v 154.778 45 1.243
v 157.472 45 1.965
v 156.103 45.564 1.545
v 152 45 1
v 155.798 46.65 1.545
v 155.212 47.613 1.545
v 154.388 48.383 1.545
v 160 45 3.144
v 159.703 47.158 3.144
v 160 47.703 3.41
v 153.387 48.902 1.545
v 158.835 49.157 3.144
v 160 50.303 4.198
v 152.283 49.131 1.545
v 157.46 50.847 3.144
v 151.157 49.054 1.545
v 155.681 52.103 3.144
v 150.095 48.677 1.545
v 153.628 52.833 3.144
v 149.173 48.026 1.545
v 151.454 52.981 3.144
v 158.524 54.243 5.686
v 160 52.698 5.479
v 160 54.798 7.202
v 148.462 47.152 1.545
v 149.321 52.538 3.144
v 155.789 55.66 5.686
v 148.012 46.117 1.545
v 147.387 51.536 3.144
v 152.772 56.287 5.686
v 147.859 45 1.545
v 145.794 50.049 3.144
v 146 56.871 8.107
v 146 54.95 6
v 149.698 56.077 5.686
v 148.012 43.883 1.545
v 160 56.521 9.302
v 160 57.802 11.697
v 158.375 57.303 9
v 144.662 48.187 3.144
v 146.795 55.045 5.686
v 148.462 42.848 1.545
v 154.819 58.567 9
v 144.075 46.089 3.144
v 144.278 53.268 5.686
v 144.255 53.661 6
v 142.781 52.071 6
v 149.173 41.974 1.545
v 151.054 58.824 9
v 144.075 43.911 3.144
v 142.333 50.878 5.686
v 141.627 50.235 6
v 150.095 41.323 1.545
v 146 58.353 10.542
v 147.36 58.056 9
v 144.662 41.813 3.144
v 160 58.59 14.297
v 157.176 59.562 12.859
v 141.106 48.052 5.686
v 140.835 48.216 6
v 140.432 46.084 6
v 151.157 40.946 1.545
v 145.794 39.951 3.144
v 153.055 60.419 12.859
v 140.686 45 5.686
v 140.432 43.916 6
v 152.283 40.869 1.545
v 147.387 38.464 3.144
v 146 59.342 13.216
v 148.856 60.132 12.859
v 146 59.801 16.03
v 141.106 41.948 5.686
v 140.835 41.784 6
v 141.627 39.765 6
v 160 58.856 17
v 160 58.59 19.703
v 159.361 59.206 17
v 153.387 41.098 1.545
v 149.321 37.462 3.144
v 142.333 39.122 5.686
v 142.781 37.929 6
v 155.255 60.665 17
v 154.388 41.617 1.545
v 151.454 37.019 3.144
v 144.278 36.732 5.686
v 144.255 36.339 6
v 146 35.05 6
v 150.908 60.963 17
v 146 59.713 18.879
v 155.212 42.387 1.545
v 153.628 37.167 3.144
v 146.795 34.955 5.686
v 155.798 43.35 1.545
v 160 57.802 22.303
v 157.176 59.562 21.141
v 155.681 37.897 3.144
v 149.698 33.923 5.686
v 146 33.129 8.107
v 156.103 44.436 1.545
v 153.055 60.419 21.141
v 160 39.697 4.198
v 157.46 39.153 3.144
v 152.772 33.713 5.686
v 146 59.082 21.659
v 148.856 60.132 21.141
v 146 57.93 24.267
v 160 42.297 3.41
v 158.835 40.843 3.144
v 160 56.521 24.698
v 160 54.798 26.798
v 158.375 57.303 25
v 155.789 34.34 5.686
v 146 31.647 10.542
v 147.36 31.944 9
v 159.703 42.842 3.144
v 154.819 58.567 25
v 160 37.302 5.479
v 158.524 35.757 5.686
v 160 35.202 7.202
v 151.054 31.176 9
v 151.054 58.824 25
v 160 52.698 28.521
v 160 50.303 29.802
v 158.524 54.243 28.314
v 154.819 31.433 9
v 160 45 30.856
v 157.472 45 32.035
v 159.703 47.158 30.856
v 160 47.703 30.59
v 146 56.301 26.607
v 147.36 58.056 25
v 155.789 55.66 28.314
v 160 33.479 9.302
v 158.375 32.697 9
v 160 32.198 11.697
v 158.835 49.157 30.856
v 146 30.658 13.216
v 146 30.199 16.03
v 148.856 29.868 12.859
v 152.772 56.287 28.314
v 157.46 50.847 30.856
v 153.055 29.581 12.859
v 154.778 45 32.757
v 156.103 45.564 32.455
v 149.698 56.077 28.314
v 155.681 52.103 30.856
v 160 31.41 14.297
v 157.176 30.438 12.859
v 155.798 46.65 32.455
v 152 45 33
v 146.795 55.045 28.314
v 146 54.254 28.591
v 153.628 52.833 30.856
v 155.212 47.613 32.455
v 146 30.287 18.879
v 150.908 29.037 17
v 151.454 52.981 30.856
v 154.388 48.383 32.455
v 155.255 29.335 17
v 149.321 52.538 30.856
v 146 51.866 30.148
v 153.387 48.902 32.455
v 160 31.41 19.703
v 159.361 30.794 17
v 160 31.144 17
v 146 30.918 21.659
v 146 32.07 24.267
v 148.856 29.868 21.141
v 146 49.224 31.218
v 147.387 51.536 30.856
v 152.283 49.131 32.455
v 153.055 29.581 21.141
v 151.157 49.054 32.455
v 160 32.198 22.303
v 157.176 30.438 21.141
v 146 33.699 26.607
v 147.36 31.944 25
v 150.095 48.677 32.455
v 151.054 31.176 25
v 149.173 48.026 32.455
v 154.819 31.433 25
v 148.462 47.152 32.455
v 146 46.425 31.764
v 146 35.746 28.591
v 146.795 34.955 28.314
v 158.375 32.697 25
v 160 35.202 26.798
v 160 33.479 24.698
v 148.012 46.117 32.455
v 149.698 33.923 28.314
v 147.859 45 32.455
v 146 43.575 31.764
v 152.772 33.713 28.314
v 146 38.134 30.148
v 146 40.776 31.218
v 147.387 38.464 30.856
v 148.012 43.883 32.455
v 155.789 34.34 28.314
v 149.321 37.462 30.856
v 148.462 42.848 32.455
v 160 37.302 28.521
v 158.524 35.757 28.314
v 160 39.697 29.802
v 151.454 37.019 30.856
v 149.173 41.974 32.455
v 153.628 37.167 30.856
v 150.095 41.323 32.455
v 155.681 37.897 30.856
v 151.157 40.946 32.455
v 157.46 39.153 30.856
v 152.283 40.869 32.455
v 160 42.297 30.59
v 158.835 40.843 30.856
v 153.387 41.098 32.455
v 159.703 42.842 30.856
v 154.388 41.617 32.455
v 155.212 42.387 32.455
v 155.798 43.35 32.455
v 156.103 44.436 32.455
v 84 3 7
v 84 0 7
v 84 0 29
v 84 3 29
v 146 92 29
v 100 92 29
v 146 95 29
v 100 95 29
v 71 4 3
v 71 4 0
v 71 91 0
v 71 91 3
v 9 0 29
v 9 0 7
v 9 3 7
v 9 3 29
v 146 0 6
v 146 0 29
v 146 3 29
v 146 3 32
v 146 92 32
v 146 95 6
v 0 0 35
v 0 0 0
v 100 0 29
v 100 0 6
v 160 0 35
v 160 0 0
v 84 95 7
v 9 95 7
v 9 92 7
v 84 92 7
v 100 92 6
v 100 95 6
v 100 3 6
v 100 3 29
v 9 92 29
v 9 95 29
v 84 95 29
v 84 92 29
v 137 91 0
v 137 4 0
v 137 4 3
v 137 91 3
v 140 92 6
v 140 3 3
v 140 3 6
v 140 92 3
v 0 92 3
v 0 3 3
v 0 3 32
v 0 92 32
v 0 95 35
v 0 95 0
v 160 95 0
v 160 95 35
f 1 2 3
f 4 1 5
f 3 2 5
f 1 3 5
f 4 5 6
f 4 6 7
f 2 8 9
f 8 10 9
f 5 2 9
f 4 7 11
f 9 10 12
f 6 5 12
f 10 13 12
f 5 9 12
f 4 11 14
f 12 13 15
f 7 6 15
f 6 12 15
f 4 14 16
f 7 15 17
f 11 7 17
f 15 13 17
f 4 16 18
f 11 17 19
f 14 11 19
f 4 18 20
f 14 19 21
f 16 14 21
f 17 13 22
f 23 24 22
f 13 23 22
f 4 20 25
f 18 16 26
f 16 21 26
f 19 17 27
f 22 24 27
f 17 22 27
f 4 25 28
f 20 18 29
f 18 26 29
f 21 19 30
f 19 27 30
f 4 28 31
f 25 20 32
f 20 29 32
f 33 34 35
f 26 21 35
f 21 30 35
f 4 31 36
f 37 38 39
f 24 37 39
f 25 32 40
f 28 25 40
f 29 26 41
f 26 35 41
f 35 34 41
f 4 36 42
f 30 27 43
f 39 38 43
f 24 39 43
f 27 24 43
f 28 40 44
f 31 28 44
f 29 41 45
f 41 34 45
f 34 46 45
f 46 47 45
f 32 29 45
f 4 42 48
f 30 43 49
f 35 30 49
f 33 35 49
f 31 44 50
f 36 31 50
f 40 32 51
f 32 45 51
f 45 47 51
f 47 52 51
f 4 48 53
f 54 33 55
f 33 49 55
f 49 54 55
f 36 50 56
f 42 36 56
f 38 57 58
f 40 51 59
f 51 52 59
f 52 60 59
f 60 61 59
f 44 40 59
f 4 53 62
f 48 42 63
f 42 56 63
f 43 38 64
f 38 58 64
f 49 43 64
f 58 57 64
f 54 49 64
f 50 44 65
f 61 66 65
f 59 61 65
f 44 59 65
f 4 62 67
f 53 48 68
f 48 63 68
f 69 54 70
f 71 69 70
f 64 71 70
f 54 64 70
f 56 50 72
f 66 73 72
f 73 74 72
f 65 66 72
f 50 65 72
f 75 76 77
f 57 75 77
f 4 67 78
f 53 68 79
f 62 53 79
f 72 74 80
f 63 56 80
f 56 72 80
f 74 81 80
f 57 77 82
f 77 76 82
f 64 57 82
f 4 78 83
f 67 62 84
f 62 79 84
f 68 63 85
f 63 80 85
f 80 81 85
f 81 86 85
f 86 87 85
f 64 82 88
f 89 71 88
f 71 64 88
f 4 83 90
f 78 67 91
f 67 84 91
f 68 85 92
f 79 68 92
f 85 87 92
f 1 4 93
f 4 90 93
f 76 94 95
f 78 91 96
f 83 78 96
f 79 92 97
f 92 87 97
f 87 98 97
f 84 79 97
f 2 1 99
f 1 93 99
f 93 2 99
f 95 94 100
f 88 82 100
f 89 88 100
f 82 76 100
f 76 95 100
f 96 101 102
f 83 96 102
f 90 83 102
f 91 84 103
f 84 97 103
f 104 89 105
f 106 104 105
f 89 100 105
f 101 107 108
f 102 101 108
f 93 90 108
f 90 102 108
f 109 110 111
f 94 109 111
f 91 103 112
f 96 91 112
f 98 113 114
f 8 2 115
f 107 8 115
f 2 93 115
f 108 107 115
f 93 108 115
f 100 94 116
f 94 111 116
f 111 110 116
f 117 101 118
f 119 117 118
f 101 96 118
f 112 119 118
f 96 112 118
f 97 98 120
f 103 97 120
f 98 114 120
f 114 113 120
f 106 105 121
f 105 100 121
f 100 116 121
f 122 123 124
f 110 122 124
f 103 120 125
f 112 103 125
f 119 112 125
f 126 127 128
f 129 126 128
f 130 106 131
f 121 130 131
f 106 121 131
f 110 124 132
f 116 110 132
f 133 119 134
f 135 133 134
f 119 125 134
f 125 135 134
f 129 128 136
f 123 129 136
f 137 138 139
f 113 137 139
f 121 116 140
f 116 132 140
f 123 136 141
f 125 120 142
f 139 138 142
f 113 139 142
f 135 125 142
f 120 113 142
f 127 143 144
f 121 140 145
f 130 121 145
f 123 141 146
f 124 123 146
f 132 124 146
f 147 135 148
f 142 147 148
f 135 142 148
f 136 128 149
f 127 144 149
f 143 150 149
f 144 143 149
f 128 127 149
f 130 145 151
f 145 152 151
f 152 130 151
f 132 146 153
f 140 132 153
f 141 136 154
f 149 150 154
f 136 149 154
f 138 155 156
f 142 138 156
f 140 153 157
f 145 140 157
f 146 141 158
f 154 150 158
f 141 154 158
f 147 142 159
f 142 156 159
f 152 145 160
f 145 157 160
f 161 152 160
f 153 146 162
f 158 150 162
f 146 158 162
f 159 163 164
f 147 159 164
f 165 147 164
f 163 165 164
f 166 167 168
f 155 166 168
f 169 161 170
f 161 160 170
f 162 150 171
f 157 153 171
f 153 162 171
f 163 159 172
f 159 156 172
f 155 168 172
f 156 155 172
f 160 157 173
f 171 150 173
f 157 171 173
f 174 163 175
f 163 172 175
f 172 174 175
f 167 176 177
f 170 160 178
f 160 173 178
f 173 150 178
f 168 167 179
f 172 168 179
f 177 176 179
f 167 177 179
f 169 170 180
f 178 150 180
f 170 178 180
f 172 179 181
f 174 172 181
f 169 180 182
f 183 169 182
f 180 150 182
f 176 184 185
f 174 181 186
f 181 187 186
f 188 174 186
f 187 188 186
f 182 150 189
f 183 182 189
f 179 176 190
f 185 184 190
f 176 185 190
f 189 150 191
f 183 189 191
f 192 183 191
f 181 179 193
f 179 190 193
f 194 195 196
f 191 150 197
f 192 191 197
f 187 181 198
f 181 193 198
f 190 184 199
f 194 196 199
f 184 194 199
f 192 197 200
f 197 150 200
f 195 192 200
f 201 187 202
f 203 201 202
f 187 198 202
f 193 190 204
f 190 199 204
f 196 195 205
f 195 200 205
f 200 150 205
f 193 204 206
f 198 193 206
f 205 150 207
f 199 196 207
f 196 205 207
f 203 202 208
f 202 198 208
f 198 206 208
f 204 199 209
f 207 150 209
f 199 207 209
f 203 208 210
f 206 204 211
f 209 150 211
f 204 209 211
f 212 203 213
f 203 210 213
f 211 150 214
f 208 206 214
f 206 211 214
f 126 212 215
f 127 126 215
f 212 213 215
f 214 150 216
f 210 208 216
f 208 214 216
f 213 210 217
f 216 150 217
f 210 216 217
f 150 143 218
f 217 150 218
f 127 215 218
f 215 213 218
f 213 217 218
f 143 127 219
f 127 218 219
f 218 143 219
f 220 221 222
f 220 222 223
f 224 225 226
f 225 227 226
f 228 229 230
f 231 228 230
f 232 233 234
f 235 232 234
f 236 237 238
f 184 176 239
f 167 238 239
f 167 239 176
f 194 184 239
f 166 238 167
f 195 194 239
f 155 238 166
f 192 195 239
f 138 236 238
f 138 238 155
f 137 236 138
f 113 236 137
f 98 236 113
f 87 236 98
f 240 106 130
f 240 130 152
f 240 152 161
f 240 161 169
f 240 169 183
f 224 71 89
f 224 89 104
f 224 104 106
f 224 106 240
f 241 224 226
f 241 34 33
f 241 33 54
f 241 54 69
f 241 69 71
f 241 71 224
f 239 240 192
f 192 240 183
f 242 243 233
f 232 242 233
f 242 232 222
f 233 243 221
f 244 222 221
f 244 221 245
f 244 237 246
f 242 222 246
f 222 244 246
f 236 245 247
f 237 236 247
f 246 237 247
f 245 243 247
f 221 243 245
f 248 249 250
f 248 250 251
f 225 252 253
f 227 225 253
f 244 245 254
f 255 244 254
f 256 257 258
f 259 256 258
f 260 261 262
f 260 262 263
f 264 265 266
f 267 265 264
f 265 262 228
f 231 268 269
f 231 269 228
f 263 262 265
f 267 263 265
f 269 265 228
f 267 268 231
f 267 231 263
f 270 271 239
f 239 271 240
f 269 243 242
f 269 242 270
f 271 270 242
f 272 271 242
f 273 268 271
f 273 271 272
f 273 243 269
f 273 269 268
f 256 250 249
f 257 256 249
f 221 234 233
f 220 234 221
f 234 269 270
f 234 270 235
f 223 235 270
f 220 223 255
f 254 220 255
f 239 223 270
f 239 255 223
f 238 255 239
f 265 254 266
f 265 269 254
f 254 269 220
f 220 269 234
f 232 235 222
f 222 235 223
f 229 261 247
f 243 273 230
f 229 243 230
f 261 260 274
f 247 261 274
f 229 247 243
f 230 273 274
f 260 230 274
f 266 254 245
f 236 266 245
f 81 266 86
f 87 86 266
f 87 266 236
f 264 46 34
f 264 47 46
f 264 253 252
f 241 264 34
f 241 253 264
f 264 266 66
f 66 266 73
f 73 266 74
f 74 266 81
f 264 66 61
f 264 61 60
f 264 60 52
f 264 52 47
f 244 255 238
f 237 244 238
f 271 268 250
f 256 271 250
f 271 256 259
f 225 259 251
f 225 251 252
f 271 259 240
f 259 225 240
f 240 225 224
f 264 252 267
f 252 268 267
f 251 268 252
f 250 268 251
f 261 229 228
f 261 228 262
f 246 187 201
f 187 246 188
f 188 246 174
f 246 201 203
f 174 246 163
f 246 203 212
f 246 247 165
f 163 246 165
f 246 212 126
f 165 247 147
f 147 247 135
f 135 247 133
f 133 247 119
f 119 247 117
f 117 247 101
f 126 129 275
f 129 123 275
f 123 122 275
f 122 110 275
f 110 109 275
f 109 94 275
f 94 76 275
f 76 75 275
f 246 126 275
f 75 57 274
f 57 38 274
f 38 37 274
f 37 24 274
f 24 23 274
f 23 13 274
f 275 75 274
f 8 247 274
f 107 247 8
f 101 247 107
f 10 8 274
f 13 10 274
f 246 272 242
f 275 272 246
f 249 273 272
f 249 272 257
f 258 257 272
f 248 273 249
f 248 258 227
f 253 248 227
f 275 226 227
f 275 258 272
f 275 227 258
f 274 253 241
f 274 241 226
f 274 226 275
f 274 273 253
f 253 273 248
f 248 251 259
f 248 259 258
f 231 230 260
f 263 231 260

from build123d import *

# Parameters (mm, degrees)
BOX005_W     = 14
BOX005_H     = 89
BOX005_DEPTH = 10
BOX004_W     = 46
BOX004_H     = 130
BOX004_DEPTH = 23
BOX003_W     = 66
BOX003_H     = 87
BOX003_DEPTH = 10
BOX002_W     = 140
BOX002_H     = 89
BOX002_DEPTH = 29
BOX001_W     = 75
BOX001_H     = 150
BOX001_DEPTH = 22
BOX_W        = 160
BOX_H        = 95
BOX_DEPTH    = 35


with BuildPart() as cubo005:
    # Box005 → Box005 (new body)
    with BuildSketch(Plane(origin=(132, 3, 22), x_dir=(1, 0, 0), z_dir=(0, 0, 1))):
        with Locations((7, 44.5)):
            Rectangle(BOX005_W, BOX005_H)
    extrude(amount=BOX005_DEPTH)


with BuildPart() as cubo004:
    # Box004 → Box004 (new body)
    with BuildSketch(Plane(origin=(100, -4, 6), x_dir=(1, 0, 0), z_dir=(0, 0, 1))):
        with Locations((23, 65)):
            Rectangle(BOX004_W, BOX004_H)
    extrude(amount=BOX004_DEPTH)


with BuildPart() as cubo003:
    # Box003 → Box003 (new body)
    with BuildSketch(Plane(origin=(71, 4, 0), x_dir=(1, 0, 0), z_dir=(0, 0, 1))):
        with Locations((33, 43.5)):
            Rectangle(BOX003_W, BOX003_H)
    extrude(amount=BOX003_DEPTH)


with BuildPart() as esfera:
    # Sphere → Sphere (revolve)
    with BuildSketch(Plane(origin=(152, 45, 17), x_dir=(1, 0, 0), z_dir=(0, -1, 0))):
        with BuildLine():
            ThreePointArc((0, -16), (16, 0), (0, 16))
            Line((0, 16), (0, -16))
        make_face()
    revolve(axis=Axis((152, 45, 17), (0, 0, 1)))


with BuildPart() as cubo002:
    # Box002 → Box002 (new body)
    with BuildSketch(Plane(origin=(0, 3, 3), x_dir=(1, 0, 0), z_dir=(0, 0, 1))):
        with Locations((70, 44.5)):
            Rectangle(BOX002_W, BOX002_H)
    extrude(amount=BOX002_DEPTH)


with BuildPart() as cubo001:
    # Box001 → Box001 (new body)
    with BuildSketch(Plane(origin=(9, 0, 7), x_dir=(1, 0, 0), z_dir=(0, 0, 1))):
        with Locations((37.5, 75)):
            Rectangle(BOX001_W, BOX001_H)
    extrude(amount=BOX001_DEPTH)


with BuildPart() as cut005:
    # Box → Box (new body)
    with BuildSketch(Plane.XY):
        with Locations((80, 47.5)):
            Rectangle(BOX_W, BOX_H)
    extrude(amount=BOX_DEPTH)

    # Cut: cut Cubo001
    add(cubo001.part, mode=Mode.SUBTRACT)

    # Cut001: cut Cubo002
    add(cubo002.part, mode=Mode.SUBTRACT)

    # Cut002: cut Esfera
    add(esfera.part, mode=Mode.SUBTRACT)

    # Cut003: cut Cubo003
    add(cubo003.part, mode=Mode.SUBTRACT)

    # Cut004: cut Cubo004
    add(cubo004.part, mode=Mode.SUBTRACT)

    # Cut005: cut Cubo005
    add(cubo005.part, mode=Mode.SUBTRACT)


solid = cut005.part
